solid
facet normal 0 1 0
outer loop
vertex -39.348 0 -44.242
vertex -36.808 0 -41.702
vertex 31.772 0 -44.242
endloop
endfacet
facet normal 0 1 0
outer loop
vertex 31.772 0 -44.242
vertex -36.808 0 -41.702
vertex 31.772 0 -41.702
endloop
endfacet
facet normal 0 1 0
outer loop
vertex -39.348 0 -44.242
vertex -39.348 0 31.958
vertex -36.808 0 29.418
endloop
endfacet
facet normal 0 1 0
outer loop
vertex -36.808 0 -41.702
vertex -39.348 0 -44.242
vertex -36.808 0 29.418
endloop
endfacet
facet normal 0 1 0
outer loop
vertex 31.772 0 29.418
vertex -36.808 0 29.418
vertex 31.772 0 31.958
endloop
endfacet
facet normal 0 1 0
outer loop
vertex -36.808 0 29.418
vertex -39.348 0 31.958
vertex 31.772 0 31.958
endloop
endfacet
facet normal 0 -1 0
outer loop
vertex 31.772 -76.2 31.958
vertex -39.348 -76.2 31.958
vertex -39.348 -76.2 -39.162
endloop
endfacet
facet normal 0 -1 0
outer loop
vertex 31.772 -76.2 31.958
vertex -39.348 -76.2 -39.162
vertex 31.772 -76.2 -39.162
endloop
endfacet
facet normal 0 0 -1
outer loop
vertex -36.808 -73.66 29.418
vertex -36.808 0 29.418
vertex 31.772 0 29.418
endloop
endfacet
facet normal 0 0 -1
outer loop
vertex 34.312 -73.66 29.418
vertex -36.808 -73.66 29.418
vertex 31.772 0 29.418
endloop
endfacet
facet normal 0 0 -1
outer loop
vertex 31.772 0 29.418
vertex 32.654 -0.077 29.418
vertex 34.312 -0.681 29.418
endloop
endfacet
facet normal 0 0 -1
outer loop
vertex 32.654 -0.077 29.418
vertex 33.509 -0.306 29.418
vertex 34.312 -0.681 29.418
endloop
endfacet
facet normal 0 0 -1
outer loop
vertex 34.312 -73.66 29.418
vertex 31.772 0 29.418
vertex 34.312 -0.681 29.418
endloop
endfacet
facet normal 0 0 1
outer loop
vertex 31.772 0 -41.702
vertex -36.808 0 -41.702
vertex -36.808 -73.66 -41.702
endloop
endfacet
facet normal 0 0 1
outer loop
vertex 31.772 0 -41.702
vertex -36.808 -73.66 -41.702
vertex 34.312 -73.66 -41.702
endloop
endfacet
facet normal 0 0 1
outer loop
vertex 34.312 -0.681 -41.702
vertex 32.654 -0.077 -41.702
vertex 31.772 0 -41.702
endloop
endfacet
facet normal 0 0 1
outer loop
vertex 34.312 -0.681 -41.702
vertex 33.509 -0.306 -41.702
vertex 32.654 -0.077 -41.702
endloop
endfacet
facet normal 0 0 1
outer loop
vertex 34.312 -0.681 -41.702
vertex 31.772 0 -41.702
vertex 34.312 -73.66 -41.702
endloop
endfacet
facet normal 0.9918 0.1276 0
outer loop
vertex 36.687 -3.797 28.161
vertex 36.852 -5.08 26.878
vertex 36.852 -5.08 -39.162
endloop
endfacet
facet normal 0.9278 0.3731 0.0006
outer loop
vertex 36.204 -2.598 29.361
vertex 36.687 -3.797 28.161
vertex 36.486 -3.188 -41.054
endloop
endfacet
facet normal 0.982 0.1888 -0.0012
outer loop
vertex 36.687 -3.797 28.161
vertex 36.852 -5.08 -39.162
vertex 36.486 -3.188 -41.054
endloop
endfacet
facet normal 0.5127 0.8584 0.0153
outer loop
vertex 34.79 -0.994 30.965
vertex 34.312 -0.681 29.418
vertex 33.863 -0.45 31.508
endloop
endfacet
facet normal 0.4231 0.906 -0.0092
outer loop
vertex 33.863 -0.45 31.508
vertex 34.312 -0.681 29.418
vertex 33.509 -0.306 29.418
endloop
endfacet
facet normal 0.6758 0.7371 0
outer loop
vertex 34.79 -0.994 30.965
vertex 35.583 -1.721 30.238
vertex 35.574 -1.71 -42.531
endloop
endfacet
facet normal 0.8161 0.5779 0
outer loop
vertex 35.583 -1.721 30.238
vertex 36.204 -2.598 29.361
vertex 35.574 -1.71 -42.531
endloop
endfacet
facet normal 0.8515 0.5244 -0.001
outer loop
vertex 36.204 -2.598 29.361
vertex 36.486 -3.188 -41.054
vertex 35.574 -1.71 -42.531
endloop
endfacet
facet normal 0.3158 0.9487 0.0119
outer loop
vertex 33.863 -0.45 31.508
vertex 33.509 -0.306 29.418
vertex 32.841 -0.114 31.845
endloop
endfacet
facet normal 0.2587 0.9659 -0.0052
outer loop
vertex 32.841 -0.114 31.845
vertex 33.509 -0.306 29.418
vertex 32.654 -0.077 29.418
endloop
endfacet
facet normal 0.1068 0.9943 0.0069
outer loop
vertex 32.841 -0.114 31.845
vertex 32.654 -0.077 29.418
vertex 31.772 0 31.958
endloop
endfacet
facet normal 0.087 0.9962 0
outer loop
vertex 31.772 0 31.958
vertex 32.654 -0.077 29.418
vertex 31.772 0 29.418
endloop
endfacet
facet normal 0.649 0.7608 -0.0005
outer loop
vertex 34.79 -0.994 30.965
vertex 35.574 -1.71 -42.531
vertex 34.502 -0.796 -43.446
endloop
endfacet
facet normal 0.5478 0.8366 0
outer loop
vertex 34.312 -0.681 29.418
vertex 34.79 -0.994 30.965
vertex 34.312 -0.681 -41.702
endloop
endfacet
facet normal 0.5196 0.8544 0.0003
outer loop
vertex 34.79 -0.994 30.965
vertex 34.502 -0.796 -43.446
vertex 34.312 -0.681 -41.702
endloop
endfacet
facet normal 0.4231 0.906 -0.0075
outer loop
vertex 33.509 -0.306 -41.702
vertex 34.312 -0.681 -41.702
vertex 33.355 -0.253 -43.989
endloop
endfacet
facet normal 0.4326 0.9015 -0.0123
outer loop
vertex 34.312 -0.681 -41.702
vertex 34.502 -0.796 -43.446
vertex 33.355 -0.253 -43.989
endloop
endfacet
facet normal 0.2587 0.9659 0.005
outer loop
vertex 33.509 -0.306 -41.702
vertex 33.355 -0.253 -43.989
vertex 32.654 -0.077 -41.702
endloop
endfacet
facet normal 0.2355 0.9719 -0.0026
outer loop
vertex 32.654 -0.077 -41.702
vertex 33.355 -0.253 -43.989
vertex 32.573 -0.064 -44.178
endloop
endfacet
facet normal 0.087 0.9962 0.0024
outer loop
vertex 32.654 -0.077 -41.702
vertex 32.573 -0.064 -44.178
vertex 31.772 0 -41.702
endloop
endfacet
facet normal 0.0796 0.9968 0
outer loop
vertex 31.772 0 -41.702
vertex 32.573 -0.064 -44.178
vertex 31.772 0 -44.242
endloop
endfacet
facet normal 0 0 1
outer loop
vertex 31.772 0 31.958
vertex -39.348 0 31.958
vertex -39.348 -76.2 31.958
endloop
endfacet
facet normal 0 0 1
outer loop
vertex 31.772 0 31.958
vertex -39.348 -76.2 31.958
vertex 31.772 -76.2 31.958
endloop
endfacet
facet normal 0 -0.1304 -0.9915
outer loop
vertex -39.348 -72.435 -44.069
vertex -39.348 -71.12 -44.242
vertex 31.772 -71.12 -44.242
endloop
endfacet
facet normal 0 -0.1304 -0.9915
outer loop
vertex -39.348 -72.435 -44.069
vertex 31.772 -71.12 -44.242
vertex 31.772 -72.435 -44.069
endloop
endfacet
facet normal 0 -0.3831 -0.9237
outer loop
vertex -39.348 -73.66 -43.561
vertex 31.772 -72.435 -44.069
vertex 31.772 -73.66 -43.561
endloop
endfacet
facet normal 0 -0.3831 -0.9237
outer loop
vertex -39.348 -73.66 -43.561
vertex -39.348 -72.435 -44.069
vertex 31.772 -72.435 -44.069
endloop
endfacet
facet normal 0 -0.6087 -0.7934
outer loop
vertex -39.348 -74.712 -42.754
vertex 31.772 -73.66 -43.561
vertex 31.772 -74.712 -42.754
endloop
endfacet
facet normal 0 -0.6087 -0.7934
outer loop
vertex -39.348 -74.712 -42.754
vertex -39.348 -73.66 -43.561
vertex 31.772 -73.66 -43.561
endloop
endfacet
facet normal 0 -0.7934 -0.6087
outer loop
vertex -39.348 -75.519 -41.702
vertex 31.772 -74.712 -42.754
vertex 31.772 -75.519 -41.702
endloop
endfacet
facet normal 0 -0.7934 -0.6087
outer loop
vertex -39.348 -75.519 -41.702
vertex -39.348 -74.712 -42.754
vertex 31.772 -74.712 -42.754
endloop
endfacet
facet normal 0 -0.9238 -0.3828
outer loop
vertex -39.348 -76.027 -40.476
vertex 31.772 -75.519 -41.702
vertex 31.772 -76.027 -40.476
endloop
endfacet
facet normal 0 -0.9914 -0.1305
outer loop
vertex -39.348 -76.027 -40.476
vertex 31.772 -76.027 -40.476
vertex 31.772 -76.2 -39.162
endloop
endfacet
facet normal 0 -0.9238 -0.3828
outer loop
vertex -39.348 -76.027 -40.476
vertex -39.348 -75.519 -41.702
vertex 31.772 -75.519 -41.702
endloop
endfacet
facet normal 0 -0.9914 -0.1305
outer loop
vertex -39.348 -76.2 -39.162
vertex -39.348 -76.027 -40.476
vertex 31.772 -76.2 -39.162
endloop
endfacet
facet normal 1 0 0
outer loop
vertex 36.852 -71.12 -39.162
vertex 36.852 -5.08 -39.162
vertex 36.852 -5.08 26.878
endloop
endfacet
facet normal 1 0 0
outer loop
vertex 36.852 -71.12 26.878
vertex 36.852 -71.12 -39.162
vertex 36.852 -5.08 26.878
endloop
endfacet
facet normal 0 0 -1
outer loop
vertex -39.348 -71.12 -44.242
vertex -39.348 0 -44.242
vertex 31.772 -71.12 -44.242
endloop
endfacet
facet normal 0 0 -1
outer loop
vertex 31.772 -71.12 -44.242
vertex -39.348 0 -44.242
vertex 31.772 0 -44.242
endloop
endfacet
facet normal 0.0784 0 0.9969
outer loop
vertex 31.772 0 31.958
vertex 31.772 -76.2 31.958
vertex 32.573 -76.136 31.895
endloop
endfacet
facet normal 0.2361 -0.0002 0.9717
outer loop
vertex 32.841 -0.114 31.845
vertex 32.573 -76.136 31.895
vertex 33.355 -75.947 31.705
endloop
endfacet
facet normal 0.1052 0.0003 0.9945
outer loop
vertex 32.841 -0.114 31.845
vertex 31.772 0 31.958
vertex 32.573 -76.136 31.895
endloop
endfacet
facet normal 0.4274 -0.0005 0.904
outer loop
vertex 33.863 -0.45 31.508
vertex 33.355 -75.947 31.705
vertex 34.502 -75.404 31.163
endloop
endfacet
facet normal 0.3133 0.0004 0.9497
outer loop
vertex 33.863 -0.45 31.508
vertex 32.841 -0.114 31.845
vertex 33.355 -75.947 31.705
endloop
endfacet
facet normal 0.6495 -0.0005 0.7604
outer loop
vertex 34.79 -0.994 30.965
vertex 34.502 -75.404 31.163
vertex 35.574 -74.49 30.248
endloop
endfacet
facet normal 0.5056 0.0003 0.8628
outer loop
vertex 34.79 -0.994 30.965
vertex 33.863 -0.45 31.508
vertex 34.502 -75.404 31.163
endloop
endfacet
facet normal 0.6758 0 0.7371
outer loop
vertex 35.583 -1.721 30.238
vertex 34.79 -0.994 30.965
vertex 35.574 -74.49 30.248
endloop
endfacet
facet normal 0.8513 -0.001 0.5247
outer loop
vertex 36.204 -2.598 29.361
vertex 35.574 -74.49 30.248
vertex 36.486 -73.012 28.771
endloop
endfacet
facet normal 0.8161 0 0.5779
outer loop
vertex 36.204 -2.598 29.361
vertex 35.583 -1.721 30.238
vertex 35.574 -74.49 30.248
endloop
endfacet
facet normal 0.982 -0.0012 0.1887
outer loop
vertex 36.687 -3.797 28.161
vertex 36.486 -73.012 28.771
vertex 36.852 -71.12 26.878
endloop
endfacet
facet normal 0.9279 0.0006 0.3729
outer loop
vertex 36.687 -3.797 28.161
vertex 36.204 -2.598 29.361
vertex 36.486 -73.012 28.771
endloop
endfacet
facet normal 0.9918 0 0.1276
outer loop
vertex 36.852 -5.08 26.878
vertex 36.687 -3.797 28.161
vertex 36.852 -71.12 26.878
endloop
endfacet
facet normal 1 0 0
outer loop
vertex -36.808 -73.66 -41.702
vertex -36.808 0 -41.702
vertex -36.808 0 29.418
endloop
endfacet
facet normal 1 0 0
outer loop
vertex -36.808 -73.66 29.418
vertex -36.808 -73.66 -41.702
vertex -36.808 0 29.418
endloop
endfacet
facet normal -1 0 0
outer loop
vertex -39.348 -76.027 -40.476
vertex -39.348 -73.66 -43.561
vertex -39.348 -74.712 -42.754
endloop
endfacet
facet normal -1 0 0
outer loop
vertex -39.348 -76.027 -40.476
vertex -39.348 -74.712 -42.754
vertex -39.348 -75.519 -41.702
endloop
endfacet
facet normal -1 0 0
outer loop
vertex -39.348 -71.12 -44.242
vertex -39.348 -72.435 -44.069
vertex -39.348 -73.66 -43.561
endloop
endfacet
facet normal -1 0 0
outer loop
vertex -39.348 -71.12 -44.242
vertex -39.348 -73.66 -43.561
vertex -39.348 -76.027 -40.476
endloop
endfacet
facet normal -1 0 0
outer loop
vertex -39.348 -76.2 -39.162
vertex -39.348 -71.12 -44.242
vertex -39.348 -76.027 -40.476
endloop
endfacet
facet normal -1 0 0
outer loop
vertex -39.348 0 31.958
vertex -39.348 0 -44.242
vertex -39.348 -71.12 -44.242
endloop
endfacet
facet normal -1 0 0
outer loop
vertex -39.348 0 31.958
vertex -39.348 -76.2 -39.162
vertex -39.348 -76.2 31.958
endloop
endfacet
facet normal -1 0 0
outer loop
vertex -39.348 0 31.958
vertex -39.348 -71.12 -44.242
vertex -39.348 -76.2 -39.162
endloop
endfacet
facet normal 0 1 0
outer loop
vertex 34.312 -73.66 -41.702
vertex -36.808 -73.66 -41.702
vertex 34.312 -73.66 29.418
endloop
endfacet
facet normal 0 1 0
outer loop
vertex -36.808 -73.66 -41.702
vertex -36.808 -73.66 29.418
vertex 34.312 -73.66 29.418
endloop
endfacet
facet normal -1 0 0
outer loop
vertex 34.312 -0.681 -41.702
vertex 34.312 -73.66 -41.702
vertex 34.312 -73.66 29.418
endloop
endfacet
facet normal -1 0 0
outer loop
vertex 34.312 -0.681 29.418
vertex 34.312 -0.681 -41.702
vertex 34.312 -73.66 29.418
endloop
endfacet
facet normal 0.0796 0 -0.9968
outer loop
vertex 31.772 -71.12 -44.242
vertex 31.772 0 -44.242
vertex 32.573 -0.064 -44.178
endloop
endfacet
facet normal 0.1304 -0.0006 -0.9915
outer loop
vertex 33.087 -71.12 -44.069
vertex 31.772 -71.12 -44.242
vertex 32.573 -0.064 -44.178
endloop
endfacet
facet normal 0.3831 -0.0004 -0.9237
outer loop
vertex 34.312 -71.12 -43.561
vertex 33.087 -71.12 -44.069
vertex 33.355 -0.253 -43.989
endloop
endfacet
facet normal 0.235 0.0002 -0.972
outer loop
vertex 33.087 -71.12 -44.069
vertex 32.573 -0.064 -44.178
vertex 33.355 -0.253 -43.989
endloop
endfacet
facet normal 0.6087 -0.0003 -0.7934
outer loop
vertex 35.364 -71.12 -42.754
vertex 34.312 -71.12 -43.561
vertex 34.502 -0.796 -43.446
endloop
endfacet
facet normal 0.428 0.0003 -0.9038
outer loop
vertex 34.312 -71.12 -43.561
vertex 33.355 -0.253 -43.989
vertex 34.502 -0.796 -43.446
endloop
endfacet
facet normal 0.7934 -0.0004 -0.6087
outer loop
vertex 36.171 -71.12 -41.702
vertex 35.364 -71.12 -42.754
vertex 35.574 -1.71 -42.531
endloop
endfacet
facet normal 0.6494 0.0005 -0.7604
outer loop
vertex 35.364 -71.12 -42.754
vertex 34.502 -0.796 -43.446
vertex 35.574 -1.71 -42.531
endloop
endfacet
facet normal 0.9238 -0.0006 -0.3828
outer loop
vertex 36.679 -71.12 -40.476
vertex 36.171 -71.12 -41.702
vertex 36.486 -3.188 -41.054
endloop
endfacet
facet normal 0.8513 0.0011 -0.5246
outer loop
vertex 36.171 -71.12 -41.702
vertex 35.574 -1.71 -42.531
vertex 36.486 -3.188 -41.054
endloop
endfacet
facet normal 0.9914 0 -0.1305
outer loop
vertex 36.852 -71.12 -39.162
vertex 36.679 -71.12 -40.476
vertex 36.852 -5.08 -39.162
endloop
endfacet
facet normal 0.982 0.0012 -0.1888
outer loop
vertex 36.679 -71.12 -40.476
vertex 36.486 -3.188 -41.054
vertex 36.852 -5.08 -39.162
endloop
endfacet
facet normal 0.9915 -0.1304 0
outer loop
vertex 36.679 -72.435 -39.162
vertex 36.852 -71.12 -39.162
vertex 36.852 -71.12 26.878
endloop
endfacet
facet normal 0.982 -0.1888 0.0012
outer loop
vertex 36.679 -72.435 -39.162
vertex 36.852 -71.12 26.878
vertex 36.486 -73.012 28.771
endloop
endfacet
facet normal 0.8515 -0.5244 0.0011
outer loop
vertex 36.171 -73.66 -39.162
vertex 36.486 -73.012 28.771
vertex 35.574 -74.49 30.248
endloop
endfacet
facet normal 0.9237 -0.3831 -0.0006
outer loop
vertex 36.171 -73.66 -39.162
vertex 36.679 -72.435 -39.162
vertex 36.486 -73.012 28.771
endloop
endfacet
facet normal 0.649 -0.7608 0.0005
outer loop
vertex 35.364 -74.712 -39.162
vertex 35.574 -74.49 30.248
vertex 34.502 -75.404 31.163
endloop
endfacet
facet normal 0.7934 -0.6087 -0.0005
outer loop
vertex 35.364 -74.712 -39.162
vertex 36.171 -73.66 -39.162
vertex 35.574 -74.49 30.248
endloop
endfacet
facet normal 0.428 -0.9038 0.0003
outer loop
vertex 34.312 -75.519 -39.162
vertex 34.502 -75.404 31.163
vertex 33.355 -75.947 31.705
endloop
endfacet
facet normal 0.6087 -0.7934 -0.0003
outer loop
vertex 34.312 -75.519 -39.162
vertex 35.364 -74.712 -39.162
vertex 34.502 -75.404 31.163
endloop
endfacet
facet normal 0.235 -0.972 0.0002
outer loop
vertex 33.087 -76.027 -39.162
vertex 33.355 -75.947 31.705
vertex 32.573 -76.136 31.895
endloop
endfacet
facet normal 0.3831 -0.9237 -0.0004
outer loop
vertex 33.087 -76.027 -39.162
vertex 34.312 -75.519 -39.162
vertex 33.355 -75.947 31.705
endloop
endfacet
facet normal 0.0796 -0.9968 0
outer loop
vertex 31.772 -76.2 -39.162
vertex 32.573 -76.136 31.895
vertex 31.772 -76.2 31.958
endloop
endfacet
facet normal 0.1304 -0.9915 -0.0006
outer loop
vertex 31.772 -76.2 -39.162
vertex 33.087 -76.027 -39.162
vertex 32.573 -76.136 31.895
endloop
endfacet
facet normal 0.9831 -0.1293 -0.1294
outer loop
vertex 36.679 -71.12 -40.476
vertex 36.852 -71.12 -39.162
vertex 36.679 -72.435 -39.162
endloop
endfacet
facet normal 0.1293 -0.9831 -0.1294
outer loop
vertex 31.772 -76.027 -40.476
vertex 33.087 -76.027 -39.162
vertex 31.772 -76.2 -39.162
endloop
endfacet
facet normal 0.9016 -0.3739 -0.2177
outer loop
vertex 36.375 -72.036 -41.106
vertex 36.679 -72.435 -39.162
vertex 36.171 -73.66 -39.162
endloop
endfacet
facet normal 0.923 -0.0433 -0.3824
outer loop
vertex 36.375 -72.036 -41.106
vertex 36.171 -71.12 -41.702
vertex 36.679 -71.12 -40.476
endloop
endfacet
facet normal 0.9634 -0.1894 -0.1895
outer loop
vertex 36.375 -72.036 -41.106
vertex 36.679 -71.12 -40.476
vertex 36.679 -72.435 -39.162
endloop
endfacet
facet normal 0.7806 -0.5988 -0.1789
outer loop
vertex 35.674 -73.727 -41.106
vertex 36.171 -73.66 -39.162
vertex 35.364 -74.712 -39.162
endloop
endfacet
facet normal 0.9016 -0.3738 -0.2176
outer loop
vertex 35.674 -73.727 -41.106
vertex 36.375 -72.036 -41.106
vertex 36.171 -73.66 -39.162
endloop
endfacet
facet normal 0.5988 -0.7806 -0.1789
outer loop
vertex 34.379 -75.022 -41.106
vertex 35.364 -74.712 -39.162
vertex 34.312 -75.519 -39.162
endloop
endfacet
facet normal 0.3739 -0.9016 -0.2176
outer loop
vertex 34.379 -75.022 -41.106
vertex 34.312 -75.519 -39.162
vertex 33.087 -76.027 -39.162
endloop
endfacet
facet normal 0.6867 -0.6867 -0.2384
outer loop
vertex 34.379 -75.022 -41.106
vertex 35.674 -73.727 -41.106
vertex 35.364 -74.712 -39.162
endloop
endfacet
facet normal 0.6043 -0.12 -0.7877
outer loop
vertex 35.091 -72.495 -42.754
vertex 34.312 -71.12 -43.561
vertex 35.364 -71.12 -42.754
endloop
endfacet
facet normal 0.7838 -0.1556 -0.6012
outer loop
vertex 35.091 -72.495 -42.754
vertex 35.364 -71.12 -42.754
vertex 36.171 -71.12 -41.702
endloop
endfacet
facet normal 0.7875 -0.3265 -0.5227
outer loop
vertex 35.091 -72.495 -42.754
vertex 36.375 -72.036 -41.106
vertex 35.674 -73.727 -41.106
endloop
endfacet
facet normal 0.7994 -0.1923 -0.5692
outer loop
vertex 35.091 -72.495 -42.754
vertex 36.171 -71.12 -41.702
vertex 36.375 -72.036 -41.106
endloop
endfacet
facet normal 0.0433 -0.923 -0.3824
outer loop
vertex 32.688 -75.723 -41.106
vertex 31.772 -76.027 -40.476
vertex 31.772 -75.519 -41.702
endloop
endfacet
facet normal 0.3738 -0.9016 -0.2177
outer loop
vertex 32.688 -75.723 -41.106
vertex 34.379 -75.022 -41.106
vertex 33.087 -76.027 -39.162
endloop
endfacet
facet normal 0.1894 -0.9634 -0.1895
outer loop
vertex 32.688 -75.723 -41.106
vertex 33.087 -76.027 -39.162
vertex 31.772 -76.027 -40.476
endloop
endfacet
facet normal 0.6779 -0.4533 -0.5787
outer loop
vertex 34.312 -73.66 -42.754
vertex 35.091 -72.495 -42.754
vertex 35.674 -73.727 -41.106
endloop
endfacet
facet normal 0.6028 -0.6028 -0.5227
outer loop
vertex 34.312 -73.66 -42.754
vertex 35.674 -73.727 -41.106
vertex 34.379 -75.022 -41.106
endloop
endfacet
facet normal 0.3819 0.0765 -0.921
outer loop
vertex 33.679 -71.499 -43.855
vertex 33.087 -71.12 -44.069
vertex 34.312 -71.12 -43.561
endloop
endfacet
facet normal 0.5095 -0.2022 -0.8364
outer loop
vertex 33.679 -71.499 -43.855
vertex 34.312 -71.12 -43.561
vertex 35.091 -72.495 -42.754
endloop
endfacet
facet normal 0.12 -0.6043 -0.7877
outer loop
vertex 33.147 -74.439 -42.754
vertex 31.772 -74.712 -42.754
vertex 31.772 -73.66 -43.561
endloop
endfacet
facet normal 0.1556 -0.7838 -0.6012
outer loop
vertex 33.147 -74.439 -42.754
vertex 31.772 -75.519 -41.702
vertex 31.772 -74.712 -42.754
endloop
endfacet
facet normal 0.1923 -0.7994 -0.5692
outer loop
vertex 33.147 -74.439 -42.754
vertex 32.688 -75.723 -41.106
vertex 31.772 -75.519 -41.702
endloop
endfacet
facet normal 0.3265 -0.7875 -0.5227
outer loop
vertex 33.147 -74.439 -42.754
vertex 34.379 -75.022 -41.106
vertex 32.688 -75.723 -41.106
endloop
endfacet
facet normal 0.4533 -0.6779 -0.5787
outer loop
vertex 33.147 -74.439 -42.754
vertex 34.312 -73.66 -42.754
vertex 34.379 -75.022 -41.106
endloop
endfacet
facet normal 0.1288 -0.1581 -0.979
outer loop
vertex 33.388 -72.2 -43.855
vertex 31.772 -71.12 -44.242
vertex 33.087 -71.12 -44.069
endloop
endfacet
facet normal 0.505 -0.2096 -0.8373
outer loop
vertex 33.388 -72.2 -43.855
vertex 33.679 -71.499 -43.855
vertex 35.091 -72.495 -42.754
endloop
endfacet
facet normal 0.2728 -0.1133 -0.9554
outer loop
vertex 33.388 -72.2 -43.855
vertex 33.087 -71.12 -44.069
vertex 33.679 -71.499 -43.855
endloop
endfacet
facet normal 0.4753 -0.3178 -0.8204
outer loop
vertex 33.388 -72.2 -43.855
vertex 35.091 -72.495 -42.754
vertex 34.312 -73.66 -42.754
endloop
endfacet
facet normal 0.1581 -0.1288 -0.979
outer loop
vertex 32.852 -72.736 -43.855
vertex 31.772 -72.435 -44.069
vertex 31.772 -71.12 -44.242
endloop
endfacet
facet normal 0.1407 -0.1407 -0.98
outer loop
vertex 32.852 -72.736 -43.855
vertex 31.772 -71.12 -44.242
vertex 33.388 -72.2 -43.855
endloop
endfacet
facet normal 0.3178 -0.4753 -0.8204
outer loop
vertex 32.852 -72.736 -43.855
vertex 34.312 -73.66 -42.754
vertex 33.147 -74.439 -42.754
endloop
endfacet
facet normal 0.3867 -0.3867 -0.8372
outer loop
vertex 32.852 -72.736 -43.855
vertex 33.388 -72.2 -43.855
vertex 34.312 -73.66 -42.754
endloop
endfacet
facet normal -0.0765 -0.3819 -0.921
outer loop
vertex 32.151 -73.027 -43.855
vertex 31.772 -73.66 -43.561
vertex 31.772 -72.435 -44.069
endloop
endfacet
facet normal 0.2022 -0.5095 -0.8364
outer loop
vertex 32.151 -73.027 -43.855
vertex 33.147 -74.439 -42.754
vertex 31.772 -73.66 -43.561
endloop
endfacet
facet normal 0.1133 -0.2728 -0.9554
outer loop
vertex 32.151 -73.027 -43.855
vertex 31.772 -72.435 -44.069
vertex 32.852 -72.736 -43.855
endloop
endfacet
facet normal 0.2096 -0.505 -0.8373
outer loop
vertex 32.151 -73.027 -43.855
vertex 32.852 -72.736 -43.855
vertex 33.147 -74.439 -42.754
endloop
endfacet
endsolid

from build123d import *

# Parameters (mm, degrees)
F0_W         = 76.2
F0_H         = 76.2
F1_DEPTH     = 76.2
F2_T         = -2.54
F3_T1_DEPTH  = 83.82
F3_T3_DEPTH  = 83.82
F3_T5_DEPTH  = 83.82
F3_T7_DEPTH  = 101.6
F3_T9_DEPTH  = 101.6
F3_S13_W     = 5.08
F3_S13_H     = 5.08
F3_T14_DEPTH = 5.08


# Not quite as in the source:
# - a fillet or chamfer that OpenCascade refuses, or shapes differently, is made with other operations: its cross-section is extruded or revolved along the edge and cut away or added


with BuildPart() as f1:
    # F0 (on Front) → F1 (new body)
    with BuildSketch(Plane.XZ):
        with Locations((-1.2479908764, -6.1416627283)):
            Rectangle(F0_W, F0_H)
    extrude(amount=F1_DEPTH)

    # F2
    f2_openings = [f1.faces().sort_by_distance(p)[0] for p in [
        (-1.247991, 0, -6.141663),
    ]]
    offset(amount=F2_T, openings=f2_openings)

    # F3: fillet of radius 5.08 on 5 edges, made by hand

    # F3_s2 → F3_t1 (cut)
    with BuildSketch(Plane.XY.offset(-39.1616627283)):
        with BuildLine():
            ThreePointArc((36.8520091236, -71.12), (35.364111572, -74.7121024484), (31.7720091236, -76.2))
            Line((31.7720091236, -76.2), (36.8520091236, -76.2))
            Line((36.8520091236, -76.2), (36.8520091236, -71.12))
        make_face()
    extrude(amount=F3_T1_DEPTH, mode=Mode.SUBTRACT)

    # F3_s4 → F3_t3 (cut)
    with BuildSketch(Plane.YZ.offset(-52.0479908764)):
        with BuildLine():
            ThreePointArc((-71.12, -44.2416627283), (-74.7121024484, -42.7537651767), (-76.2, -39.1616627283))
            Line((-76.2, -39.1616627283), (-76.2, -44.2416627283))
            Line((-76.2, -44.2416627283), (-71.12, -44.2416627283))
        make_face()
    extrude(amount=F3_T3_DEPTH, mode=Mode.SUBTRACT)

    # F3_s6 → F3_t5 (cut)
    with BuildSketch(Plane.XZ.offset(-12.7)):
        with BuildLine():
            ThreePointArc((31.7720091236, -44.2416627283), (35.364111572, -42.7537651767), (36.8520091236, -39.1616627283))
            Line((36.8520091236, -39.1616627283), (36.8520091236, -44.2416627283))
            Line((36.8520091236, -44.2416627283), (31.7720091236, -44.2416627283))
        make_face()
    extrude(amount=F3_T5_DEPTH, mode=Mode.SUBTRACT)

    # F3_s8 → F3_t7 (cut)
    with BuildSketch(Plane.XY.offset(-56.9416627283)):
        with BuildLine():
            ThreePointArc((36.8520091236, -5.08), (35.364111572, -1.4878975516), (31.7720091236, 0))
            Line((31.7720091236, 0), (36.8520091236, 0))
            Line((36.8520091236, 0), (36.8520091236, -5.08))
        make_face()
    extrude(amount=F3_T7_DEPTH, mode=Mode.SUBTRACT)

    # F3_s10 → F3_t9 (cut)
    with BuildSketch(Plane.XZ.offset(-12.7)):
        with BuildLine():
            ThreePointArc((31.7720091236, 31.9583372717), (35.364111572, 30.4704397201), (36.8520091236, 26.8783372717))
            Line((36.8520091236, 26.8783372717), (36.8520091236, 31.9583372717))
            Line((36.8520091236, 31.9583372717), (31.7720091236, 31.9583372717))
        make_face()
    extrude(amount=F3_T9_DEPTH, mode=Mode.SUBTRACT)


with BuildPart() as f3_tool12:
    # F3_s13 → F3_t14 (new body)
    with BuildSketch(Plane.XY.offset(-39.1616627283)):
        with Locations((34.3120091236, -73.66)):
            Rectangle(F3_S13_W, F3_S13_H)
    extrude(amount=-F3_T14_DEPTH)

    # F3_s15 → F3_t16 (revolve, cut)
    with BuildSketch(Plane(origin=(31.7720091236, -71.12, -39.1616627283), x_dir=(-0.7071067812, 0.7071067812, 0), z_dir=(-0.7071067812, -0.7071067812, 0))):
        with BuildLine():
            ThreePointArc((0, -5.08), (5.08, 0), (0, 5.08))
            Line((0, 5.08), (0, -5.08))
        make_face()
    revolve(axis=Axis((31.7720091236, -71.12, -39.1616627283), (0, 0, -1)), mode=Mode.SUBTRACT)


with BuildPart() as f1_1:
    add(f1.part)

    # F3_t11: cut F3_tool12
    add(f3_tool12.part, mode=Mode.SUBTRACT)


solid = f1_1.part
